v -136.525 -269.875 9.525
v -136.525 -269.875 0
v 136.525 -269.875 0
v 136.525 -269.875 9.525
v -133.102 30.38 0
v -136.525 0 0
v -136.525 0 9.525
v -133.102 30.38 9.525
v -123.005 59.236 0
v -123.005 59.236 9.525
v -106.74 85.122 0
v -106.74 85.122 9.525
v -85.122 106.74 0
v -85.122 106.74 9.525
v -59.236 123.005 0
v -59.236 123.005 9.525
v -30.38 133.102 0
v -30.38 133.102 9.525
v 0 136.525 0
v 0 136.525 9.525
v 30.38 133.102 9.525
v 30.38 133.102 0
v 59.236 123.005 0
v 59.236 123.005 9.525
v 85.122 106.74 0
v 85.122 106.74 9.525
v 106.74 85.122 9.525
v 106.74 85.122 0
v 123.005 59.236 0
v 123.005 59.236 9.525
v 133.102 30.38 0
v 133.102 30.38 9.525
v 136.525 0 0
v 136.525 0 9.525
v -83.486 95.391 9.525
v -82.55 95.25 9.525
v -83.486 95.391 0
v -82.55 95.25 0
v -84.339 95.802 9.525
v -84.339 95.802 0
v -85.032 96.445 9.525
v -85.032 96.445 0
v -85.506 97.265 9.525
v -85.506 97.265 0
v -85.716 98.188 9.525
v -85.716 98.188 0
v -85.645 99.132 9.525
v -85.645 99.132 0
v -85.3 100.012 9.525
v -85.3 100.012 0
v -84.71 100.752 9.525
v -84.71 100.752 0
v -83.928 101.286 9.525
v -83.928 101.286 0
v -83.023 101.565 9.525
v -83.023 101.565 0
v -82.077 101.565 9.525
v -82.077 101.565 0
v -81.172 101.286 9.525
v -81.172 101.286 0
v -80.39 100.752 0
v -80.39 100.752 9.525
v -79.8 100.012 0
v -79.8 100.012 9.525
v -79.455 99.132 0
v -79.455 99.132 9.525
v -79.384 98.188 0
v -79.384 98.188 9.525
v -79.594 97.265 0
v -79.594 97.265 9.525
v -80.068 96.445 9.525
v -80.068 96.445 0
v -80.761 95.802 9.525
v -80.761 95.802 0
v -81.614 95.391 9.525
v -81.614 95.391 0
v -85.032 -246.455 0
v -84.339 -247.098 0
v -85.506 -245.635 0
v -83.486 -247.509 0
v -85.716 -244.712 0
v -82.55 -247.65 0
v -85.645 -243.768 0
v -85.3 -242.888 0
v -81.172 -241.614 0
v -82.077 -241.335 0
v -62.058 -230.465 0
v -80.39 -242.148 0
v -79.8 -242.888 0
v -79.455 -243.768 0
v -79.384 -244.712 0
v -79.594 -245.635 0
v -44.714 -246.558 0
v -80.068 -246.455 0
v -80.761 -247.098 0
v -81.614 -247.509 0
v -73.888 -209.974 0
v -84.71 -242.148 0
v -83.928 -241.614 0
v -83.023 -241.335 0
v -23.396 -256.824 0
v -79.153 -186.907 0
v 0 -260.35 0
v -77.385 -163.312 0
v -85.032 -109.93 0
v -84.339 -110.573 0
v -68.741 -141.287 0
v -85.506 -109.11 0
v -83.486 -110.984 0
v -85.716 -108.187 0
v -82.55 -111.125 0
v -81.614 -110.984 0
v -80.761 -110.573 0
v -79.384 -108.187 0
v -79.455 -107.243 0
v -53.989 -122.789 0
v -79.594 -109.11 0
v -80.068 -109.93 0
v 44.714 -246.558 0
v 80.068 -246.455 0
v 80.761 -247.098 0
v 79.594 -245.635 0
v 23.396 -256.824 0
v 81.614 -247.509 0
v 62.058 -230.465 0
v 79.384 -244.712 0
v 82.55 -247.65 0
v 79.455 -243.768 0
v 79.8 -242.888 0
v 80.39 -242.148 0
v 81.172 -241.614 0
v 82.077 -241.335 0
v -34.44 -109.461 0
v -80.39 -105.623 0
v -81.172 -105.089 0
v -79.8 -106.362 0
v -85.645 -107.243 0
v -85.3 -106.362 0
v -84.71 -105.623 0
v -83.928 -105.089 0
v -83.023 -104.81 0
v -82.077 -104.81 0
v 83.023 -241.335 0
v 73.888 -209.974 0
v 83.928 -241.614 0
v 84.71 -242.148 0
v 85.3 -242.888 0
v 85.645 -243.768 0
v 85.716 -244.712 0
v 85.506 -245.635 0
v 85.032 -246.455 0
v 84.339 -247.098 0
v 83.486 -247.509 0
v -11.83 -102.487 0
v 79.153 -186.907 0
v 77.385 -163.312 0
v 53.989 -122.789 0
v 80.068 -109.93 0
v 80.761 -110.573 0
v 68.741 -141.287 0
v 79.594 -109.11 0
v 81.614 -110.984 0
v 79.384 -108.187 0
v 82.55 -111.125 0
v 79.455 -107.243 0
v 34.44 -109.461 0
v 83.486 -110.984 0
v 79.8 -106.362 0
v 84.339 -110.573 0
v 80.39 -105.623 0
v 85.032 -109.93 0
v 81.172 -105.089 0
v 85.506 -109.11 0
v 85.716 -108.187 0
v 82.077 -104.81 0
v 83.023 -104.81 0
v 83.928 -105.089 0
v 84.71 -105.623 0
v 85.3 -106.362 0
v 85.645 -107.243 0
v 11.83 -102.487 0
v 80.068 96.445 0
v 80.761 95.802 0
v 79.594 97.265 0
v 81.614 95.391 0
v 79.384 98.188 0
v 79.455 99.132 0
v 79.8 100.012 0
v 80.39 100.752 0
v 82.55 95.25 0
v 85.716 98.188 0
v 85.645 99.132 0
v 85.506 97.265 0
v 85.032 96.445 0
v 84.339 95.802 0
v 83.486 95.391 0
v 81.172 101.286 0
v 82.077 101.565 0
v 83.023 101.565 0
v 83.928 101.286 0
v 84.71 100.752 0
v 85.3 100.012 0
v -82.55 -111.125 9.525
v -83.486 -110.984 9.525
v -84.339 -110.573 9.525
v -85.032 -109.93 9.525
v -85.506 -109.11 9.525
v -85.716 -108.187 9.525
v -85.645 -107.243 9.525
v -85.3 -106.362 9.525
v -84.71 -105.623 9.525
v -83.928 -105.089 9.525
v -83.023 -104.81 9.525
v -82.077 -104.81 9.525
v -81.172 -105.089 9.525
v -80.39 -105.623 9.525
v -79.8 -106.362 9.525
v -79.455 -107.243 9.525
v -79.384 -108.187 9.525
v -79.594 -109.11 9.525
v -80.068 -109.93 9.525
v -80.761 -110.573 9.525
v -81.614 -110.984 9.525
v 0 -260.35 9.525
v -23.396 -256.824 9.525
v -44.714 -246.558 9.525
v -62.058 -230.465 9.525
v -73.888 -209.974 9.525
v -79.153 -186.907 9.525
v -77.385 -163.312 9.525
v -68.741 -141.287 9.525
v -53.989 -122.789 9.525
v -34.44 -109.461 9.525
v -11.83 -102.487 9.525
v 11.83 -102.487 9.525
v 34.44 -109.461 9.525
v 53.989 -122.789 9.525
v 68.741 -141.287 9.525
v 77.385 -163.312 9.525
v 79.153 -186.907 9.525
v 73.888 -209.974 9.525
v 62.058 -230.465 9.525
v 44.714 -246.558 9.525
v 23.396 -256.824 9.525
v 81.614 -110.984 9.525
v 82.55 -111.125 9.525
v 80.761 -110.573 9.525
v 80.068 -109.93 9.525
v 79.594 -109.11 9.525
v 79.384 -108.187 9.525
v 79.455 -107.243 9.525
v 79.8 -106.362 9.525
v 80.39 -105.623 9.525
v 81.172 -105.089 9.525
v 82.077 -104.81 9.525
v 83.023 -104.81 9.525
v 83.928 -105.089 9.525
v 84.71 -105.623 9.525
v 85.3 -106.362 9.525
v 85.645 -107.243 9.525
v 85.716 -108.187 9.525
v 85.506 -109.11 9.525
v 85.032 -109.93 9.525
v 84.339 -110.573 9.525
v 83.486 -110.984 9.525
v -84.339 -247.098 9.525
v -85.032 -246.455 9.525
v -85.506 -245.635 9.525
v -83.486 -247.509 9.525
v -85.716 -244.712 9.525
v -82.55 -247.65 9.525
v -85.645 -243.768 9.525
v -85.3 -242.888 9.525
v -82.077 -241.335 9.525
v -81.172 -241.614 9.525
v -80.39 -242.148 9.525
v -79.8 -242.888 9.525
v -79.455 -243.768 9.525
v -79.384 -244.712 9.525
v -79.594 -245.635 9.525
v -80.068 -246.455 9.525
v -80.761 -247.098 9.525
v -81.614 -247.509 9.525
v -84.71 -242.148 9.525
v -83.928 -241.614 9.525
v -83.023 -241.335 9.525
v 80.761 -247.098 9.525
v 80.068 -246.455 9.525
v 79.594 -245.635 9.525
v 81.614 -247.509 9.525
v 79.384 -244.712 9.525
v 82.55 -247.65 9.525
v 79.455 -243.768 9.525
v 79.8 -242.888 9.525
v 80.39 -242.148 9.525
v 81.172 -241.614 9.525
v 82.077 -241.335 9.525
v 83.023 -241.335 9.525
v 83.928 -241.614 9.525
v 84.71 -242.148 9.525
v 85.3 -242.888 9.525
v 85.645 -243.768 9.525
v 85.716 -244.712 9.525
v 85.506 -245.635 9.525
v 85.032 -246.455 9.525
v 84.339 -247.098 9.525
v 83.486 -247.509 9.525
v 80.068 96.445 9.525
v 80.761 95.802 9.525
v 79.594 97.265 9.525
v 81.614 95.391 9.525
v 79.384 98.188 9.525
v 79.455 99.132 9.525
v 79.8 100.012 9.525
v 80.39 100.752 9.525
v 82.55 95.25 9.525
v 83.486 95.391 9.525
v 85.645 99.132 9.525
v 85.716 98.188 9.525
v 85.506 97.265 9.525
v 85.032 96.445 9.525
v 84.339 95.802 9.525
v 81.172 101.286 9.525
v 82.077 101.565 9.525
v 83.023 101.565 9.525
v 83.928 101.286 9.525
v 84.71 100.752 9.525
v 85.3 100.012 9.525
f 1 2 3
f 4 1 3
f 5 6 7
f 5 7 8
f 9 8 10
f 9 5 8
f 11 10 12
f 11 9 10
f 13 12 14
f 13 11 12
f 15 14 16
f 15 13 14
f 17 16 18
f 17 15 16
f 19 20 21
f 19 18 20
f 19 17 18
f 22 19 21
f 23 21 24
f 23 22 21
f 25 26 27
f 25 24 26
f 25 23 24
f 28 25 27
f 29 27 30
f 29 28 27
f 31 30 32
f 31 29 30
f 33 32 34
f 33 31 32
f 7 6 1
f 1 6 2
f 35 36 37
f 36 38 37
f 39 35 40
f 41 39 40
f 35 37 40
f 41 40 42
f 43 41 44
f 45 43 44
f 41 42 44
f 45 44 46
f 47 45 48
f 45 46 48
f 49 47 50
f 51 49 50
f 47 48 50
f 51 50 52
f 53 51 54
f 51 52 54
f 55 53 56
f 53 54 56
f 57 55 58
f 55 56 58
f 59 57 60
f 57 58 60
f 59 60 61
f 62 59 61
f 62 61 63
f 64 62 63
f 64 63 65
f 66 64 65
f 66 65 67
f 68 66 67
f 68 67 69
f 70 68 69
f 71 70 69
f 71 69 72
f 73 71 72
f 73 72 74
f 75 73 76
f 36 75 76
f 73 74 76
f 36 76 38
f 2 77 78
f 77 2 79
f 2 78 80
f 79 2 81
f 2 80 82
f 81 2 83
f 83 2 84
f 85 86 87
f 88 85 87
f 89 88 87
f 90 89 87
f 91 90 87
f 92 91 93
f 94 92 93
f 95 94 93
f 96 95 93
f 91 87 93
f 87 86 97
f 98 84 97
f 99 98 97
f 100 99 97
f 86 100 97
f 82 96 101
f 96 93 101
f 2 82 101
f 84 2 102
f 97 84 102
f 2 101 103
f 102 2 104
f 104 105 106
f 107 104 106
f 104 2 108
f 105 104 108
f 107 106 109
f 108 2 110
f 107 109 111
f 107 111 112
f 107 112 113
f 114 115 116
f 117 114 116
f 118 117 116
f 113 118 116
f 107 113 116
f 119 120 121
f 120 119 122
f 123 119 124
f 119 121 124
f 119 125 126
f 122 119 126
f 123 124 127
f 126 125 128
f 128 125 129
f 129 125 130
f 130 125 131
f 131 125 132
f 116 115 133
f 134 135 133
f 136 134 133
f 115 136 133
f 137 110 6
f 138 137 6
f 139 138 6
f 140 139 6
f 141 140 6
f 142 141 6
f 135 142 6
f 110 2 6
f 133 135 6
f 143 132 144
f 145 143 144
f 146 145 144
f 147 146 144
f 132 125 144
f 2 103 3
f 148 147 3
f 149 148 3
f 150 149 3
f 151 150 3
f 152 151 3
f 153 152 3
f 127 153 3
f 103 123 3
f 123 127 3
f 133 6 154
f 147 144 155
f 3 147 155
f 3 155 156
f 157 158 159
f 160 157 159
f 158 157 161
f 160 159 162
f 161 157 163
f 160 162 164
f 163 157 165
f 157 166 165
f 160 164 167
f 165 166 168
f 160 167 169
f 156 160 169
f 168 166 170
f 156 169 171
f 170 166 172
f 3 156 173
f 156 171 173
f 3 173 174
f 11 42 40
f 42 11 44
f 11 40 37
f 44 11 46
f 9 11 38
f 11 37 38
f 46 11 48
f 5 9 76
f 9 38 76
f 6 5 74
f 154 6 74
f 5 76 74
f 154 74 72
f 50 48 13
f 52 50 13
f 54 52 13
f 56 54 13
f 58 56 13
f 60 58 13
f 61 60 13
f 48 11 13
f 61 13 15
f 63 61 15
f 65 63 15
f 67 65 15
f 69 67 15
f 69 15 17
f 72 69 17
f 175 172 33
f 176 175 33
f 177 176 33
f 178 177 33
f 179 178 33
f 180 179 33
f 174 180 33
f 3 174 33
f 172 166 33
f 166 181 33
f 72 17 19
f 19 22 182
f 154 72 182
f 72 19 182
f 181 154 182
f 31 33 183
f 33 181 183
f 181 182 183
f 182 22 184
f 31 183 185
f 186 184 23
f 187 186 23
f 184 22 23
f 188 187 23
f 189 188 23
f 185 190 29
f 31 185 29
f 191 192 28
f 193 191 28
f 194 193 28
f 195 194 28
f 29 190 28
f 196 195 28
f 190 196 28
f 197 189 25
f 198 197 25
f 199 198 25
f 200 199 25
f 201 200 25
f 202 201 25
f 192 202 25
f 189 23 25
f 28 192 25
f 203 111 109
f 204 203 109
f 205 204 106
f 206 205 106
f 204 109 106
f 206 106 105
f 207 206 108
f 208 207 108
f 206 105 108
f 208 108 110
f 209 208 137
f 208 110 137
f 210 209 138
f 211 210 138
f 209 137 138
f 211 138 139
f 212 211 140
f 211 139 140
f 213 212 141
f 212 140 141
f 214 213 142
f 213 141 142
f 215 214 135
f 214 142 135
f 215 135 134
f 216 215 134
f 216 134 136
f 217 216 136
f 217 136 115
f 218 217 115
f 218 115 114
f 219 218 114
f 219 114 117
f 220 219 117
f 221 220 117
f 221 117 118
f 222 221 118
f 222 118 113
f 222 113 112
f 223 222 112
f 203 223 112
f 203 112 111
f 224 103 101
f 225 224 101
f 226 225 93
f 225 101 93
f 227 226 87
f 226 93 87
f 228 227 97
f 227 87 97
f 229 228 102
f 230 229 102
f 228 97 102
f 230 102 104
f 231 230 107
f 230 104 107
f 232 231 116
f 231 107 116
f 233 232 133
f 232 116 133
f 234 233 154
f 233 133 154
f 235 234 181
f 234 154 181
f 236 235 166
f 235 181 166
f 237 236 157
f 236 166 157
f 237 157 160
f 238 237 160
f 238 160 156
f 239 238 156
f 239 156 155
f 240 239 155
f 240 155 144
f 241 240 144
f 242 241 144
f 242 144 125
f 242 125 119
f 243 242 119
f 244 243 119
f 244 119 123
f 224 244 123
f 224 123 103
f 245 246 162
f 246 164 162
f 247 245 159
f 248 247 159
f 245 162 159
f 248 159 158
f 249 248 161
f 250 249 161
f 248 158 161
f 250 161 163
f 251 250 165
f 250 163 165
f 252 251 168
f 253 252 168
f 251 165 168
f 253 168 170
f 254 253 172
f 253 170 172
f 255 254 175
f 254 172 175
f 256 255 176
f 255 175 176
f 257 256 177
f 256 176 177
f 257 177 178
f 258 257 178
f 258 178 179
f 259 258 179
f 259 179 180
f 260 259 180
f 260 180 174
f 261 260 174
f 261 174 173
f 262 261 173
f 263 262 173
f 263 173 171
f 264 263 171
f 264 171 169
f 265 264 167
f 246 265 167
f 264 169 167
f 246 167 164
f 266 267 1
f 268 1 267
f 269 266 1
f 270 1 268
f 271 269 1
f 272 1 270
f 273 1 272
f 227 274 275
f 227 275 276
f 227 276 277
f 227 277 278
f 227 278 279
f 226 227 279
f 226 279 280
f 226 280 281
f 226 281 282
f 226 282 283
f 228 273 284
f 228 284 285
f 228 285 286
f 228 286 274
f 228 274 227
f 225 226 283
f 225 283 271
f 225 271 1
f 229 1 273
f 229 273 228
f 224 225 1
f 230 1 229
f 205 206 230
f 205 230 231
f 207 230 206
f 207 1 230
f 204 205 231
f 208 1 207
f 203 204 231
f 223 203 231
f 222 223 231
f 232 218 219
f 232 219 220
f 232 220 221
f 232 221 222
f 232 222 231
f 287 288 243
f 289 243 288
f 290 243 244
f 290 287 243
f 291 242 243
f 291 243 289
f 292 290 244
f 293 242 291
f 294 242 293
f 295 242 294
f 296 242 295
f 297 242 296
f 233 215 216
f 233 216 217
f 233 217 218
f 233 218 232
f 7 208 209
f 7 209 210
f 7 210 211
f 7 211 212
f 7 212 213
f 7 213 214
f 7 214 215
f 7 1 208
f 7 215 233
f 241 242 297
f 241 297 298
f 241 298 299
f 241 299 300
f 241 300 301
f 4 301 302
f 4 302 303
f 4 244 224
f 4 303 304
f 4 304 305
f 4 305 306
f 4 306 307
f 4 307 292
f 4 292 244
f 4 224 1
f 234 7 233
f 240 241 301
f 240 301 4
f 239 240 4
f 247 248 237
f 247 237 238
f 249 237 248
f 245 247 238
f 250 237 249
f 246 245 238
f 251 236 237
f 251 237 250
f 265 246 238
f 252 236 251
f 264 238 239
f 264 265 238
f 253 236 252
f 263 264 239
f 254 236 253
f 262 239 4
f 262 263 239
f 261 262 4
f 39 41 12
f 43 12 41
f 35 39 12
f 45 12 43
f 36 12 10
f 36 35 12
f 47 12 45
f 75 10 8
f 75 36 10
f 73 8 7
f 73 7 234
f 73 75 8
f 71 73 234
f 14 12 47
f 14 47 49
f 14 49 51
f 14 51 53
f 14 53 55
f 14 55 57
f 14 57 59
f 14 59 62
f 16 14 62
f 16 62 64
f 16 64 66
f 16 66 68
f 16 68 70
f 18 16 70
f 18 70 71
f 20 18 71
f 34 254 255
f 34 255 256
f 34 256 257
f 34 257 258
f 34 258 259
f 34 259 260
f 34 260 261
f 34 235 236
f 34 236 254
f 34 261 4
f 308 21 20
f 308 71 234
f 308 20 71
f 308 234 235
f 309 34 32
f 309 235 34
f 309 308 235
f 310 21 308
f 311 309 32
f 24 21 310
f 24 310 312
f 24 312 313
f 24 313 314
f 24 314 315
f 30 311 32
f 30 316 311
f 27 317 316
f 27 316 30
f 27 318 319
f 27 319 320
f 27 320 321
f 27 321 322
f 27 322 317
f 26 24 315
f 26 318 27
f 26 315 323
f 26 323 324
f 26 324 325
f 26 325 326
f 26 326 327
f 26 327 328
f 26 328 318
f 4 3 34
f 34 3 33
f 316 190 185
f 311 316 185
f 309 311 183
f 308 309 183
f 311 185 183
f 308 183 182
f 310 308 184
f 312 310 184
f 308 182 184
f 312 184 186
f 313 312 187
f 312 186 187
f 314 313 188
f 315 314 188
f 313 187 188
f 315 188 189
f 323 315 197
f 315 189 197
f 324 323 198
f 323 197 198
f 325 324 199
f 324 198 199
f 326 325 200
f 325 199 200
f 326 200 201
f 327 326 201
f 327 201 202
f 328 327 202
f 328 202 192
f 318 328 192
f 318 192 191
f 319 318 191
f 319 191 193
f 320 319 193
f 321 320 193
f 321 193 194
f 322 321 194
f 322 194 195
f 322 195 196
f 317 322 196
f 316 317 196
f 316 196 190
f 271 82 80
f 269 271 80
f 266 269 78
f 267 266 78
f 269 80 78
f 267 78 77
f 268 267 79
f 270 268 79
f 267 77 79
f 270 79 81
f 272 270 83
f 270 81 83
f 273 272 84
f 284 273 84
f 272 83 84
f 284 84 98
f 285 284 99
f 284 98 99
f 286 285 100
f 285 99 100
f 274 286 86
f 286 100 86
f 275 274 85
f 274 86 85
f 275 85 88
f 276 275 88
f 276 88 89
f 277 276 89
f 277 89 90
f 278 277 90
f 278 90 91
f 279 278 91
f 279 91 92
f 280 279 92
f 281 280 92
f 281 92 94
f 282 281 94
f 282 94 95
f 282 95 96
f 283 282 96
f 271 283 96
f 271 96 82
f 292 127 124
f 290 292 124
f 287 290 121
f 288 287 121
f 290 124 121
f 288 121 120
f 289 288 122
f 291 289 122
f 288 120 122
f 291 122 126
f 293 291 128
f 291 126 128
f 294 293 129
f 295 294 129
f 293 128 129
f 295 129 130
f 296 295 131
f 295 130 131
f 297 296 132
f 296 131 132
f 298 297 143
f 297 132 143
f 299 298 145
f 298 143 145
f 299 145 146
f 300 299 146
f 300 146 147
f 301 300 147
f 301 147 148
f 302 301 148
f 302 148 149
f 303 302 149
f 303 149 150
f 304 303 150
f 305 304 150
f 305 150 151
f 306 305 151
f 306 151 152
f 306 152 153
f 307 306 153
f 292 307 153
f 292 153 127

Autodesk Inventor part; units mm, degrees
ref_plane "YZ Plane" through (0, 0, 0) normal (1, 0, 0) x (0, 1, 0)
ref_plane "XZ Plane" through (0, 0, 0) normal (0, 1, 0) x (-1, 0, 0)
ref_plane "XY Plane" through (0, 0, 0) normal (0, 0, 1) x (1, 0, 0)
sketch "Sketch1" plane through (0, 0, 0) normal (0, 0, 1) x (1, 0, 0)
  line L0 (-136.525, 0) -> (-136.525, -269.875)
  line L1 (-136.525, -269.875) -> (136.525, -269.875)
  line L2 (136.525, -269.875) -> (136.525, 0)
  arc A0 (136.525, 0) -> (-136.525, 0) centre (0, 0) ccw
  dimension "d0" = 273.05
  dimension "d1" = 406.4
extrude "Extrusion1" add sketch "Sketch1" along normal blind 9.525
hole "Hole1" at (-82.55, -244.475, 9.525) direction (0, 0, -1) diameter 6.35 depth 25.4 tip angle 118
hole "Hole2" at (82.55, -244.475, 9.525) direction (0, 0, -1) diameter 6.35 depth 25.4 tip angle 118
hole "Hole3" at (-82.55, -107.95, 9.525) direction (0, 0, -1) diameter 6.35 depth 25.4 tip angle 118
hole "Hole4" at (82.55, -107.95, 9.525) direction (0, 0, -1) diameter 6.35 depth 25.4 tip angle 118
hole "Hole5" at (-82.55, 98.425, 9.525) direction (0, 0, -1) diameter 6.35 depth 25.4 tip angle 118
hole "Hole6" at (82.55, 98.425, 9.525) direction (0, 0, -1) diameter 6.35 depth 25.4 tip angle 118
hole "Hole7" at (0, -180.975, 9.525) direction (0, 0, -1) diameter 158.75 depth 25.4 tip angle 118
properties part number "Bottom_Deck"
